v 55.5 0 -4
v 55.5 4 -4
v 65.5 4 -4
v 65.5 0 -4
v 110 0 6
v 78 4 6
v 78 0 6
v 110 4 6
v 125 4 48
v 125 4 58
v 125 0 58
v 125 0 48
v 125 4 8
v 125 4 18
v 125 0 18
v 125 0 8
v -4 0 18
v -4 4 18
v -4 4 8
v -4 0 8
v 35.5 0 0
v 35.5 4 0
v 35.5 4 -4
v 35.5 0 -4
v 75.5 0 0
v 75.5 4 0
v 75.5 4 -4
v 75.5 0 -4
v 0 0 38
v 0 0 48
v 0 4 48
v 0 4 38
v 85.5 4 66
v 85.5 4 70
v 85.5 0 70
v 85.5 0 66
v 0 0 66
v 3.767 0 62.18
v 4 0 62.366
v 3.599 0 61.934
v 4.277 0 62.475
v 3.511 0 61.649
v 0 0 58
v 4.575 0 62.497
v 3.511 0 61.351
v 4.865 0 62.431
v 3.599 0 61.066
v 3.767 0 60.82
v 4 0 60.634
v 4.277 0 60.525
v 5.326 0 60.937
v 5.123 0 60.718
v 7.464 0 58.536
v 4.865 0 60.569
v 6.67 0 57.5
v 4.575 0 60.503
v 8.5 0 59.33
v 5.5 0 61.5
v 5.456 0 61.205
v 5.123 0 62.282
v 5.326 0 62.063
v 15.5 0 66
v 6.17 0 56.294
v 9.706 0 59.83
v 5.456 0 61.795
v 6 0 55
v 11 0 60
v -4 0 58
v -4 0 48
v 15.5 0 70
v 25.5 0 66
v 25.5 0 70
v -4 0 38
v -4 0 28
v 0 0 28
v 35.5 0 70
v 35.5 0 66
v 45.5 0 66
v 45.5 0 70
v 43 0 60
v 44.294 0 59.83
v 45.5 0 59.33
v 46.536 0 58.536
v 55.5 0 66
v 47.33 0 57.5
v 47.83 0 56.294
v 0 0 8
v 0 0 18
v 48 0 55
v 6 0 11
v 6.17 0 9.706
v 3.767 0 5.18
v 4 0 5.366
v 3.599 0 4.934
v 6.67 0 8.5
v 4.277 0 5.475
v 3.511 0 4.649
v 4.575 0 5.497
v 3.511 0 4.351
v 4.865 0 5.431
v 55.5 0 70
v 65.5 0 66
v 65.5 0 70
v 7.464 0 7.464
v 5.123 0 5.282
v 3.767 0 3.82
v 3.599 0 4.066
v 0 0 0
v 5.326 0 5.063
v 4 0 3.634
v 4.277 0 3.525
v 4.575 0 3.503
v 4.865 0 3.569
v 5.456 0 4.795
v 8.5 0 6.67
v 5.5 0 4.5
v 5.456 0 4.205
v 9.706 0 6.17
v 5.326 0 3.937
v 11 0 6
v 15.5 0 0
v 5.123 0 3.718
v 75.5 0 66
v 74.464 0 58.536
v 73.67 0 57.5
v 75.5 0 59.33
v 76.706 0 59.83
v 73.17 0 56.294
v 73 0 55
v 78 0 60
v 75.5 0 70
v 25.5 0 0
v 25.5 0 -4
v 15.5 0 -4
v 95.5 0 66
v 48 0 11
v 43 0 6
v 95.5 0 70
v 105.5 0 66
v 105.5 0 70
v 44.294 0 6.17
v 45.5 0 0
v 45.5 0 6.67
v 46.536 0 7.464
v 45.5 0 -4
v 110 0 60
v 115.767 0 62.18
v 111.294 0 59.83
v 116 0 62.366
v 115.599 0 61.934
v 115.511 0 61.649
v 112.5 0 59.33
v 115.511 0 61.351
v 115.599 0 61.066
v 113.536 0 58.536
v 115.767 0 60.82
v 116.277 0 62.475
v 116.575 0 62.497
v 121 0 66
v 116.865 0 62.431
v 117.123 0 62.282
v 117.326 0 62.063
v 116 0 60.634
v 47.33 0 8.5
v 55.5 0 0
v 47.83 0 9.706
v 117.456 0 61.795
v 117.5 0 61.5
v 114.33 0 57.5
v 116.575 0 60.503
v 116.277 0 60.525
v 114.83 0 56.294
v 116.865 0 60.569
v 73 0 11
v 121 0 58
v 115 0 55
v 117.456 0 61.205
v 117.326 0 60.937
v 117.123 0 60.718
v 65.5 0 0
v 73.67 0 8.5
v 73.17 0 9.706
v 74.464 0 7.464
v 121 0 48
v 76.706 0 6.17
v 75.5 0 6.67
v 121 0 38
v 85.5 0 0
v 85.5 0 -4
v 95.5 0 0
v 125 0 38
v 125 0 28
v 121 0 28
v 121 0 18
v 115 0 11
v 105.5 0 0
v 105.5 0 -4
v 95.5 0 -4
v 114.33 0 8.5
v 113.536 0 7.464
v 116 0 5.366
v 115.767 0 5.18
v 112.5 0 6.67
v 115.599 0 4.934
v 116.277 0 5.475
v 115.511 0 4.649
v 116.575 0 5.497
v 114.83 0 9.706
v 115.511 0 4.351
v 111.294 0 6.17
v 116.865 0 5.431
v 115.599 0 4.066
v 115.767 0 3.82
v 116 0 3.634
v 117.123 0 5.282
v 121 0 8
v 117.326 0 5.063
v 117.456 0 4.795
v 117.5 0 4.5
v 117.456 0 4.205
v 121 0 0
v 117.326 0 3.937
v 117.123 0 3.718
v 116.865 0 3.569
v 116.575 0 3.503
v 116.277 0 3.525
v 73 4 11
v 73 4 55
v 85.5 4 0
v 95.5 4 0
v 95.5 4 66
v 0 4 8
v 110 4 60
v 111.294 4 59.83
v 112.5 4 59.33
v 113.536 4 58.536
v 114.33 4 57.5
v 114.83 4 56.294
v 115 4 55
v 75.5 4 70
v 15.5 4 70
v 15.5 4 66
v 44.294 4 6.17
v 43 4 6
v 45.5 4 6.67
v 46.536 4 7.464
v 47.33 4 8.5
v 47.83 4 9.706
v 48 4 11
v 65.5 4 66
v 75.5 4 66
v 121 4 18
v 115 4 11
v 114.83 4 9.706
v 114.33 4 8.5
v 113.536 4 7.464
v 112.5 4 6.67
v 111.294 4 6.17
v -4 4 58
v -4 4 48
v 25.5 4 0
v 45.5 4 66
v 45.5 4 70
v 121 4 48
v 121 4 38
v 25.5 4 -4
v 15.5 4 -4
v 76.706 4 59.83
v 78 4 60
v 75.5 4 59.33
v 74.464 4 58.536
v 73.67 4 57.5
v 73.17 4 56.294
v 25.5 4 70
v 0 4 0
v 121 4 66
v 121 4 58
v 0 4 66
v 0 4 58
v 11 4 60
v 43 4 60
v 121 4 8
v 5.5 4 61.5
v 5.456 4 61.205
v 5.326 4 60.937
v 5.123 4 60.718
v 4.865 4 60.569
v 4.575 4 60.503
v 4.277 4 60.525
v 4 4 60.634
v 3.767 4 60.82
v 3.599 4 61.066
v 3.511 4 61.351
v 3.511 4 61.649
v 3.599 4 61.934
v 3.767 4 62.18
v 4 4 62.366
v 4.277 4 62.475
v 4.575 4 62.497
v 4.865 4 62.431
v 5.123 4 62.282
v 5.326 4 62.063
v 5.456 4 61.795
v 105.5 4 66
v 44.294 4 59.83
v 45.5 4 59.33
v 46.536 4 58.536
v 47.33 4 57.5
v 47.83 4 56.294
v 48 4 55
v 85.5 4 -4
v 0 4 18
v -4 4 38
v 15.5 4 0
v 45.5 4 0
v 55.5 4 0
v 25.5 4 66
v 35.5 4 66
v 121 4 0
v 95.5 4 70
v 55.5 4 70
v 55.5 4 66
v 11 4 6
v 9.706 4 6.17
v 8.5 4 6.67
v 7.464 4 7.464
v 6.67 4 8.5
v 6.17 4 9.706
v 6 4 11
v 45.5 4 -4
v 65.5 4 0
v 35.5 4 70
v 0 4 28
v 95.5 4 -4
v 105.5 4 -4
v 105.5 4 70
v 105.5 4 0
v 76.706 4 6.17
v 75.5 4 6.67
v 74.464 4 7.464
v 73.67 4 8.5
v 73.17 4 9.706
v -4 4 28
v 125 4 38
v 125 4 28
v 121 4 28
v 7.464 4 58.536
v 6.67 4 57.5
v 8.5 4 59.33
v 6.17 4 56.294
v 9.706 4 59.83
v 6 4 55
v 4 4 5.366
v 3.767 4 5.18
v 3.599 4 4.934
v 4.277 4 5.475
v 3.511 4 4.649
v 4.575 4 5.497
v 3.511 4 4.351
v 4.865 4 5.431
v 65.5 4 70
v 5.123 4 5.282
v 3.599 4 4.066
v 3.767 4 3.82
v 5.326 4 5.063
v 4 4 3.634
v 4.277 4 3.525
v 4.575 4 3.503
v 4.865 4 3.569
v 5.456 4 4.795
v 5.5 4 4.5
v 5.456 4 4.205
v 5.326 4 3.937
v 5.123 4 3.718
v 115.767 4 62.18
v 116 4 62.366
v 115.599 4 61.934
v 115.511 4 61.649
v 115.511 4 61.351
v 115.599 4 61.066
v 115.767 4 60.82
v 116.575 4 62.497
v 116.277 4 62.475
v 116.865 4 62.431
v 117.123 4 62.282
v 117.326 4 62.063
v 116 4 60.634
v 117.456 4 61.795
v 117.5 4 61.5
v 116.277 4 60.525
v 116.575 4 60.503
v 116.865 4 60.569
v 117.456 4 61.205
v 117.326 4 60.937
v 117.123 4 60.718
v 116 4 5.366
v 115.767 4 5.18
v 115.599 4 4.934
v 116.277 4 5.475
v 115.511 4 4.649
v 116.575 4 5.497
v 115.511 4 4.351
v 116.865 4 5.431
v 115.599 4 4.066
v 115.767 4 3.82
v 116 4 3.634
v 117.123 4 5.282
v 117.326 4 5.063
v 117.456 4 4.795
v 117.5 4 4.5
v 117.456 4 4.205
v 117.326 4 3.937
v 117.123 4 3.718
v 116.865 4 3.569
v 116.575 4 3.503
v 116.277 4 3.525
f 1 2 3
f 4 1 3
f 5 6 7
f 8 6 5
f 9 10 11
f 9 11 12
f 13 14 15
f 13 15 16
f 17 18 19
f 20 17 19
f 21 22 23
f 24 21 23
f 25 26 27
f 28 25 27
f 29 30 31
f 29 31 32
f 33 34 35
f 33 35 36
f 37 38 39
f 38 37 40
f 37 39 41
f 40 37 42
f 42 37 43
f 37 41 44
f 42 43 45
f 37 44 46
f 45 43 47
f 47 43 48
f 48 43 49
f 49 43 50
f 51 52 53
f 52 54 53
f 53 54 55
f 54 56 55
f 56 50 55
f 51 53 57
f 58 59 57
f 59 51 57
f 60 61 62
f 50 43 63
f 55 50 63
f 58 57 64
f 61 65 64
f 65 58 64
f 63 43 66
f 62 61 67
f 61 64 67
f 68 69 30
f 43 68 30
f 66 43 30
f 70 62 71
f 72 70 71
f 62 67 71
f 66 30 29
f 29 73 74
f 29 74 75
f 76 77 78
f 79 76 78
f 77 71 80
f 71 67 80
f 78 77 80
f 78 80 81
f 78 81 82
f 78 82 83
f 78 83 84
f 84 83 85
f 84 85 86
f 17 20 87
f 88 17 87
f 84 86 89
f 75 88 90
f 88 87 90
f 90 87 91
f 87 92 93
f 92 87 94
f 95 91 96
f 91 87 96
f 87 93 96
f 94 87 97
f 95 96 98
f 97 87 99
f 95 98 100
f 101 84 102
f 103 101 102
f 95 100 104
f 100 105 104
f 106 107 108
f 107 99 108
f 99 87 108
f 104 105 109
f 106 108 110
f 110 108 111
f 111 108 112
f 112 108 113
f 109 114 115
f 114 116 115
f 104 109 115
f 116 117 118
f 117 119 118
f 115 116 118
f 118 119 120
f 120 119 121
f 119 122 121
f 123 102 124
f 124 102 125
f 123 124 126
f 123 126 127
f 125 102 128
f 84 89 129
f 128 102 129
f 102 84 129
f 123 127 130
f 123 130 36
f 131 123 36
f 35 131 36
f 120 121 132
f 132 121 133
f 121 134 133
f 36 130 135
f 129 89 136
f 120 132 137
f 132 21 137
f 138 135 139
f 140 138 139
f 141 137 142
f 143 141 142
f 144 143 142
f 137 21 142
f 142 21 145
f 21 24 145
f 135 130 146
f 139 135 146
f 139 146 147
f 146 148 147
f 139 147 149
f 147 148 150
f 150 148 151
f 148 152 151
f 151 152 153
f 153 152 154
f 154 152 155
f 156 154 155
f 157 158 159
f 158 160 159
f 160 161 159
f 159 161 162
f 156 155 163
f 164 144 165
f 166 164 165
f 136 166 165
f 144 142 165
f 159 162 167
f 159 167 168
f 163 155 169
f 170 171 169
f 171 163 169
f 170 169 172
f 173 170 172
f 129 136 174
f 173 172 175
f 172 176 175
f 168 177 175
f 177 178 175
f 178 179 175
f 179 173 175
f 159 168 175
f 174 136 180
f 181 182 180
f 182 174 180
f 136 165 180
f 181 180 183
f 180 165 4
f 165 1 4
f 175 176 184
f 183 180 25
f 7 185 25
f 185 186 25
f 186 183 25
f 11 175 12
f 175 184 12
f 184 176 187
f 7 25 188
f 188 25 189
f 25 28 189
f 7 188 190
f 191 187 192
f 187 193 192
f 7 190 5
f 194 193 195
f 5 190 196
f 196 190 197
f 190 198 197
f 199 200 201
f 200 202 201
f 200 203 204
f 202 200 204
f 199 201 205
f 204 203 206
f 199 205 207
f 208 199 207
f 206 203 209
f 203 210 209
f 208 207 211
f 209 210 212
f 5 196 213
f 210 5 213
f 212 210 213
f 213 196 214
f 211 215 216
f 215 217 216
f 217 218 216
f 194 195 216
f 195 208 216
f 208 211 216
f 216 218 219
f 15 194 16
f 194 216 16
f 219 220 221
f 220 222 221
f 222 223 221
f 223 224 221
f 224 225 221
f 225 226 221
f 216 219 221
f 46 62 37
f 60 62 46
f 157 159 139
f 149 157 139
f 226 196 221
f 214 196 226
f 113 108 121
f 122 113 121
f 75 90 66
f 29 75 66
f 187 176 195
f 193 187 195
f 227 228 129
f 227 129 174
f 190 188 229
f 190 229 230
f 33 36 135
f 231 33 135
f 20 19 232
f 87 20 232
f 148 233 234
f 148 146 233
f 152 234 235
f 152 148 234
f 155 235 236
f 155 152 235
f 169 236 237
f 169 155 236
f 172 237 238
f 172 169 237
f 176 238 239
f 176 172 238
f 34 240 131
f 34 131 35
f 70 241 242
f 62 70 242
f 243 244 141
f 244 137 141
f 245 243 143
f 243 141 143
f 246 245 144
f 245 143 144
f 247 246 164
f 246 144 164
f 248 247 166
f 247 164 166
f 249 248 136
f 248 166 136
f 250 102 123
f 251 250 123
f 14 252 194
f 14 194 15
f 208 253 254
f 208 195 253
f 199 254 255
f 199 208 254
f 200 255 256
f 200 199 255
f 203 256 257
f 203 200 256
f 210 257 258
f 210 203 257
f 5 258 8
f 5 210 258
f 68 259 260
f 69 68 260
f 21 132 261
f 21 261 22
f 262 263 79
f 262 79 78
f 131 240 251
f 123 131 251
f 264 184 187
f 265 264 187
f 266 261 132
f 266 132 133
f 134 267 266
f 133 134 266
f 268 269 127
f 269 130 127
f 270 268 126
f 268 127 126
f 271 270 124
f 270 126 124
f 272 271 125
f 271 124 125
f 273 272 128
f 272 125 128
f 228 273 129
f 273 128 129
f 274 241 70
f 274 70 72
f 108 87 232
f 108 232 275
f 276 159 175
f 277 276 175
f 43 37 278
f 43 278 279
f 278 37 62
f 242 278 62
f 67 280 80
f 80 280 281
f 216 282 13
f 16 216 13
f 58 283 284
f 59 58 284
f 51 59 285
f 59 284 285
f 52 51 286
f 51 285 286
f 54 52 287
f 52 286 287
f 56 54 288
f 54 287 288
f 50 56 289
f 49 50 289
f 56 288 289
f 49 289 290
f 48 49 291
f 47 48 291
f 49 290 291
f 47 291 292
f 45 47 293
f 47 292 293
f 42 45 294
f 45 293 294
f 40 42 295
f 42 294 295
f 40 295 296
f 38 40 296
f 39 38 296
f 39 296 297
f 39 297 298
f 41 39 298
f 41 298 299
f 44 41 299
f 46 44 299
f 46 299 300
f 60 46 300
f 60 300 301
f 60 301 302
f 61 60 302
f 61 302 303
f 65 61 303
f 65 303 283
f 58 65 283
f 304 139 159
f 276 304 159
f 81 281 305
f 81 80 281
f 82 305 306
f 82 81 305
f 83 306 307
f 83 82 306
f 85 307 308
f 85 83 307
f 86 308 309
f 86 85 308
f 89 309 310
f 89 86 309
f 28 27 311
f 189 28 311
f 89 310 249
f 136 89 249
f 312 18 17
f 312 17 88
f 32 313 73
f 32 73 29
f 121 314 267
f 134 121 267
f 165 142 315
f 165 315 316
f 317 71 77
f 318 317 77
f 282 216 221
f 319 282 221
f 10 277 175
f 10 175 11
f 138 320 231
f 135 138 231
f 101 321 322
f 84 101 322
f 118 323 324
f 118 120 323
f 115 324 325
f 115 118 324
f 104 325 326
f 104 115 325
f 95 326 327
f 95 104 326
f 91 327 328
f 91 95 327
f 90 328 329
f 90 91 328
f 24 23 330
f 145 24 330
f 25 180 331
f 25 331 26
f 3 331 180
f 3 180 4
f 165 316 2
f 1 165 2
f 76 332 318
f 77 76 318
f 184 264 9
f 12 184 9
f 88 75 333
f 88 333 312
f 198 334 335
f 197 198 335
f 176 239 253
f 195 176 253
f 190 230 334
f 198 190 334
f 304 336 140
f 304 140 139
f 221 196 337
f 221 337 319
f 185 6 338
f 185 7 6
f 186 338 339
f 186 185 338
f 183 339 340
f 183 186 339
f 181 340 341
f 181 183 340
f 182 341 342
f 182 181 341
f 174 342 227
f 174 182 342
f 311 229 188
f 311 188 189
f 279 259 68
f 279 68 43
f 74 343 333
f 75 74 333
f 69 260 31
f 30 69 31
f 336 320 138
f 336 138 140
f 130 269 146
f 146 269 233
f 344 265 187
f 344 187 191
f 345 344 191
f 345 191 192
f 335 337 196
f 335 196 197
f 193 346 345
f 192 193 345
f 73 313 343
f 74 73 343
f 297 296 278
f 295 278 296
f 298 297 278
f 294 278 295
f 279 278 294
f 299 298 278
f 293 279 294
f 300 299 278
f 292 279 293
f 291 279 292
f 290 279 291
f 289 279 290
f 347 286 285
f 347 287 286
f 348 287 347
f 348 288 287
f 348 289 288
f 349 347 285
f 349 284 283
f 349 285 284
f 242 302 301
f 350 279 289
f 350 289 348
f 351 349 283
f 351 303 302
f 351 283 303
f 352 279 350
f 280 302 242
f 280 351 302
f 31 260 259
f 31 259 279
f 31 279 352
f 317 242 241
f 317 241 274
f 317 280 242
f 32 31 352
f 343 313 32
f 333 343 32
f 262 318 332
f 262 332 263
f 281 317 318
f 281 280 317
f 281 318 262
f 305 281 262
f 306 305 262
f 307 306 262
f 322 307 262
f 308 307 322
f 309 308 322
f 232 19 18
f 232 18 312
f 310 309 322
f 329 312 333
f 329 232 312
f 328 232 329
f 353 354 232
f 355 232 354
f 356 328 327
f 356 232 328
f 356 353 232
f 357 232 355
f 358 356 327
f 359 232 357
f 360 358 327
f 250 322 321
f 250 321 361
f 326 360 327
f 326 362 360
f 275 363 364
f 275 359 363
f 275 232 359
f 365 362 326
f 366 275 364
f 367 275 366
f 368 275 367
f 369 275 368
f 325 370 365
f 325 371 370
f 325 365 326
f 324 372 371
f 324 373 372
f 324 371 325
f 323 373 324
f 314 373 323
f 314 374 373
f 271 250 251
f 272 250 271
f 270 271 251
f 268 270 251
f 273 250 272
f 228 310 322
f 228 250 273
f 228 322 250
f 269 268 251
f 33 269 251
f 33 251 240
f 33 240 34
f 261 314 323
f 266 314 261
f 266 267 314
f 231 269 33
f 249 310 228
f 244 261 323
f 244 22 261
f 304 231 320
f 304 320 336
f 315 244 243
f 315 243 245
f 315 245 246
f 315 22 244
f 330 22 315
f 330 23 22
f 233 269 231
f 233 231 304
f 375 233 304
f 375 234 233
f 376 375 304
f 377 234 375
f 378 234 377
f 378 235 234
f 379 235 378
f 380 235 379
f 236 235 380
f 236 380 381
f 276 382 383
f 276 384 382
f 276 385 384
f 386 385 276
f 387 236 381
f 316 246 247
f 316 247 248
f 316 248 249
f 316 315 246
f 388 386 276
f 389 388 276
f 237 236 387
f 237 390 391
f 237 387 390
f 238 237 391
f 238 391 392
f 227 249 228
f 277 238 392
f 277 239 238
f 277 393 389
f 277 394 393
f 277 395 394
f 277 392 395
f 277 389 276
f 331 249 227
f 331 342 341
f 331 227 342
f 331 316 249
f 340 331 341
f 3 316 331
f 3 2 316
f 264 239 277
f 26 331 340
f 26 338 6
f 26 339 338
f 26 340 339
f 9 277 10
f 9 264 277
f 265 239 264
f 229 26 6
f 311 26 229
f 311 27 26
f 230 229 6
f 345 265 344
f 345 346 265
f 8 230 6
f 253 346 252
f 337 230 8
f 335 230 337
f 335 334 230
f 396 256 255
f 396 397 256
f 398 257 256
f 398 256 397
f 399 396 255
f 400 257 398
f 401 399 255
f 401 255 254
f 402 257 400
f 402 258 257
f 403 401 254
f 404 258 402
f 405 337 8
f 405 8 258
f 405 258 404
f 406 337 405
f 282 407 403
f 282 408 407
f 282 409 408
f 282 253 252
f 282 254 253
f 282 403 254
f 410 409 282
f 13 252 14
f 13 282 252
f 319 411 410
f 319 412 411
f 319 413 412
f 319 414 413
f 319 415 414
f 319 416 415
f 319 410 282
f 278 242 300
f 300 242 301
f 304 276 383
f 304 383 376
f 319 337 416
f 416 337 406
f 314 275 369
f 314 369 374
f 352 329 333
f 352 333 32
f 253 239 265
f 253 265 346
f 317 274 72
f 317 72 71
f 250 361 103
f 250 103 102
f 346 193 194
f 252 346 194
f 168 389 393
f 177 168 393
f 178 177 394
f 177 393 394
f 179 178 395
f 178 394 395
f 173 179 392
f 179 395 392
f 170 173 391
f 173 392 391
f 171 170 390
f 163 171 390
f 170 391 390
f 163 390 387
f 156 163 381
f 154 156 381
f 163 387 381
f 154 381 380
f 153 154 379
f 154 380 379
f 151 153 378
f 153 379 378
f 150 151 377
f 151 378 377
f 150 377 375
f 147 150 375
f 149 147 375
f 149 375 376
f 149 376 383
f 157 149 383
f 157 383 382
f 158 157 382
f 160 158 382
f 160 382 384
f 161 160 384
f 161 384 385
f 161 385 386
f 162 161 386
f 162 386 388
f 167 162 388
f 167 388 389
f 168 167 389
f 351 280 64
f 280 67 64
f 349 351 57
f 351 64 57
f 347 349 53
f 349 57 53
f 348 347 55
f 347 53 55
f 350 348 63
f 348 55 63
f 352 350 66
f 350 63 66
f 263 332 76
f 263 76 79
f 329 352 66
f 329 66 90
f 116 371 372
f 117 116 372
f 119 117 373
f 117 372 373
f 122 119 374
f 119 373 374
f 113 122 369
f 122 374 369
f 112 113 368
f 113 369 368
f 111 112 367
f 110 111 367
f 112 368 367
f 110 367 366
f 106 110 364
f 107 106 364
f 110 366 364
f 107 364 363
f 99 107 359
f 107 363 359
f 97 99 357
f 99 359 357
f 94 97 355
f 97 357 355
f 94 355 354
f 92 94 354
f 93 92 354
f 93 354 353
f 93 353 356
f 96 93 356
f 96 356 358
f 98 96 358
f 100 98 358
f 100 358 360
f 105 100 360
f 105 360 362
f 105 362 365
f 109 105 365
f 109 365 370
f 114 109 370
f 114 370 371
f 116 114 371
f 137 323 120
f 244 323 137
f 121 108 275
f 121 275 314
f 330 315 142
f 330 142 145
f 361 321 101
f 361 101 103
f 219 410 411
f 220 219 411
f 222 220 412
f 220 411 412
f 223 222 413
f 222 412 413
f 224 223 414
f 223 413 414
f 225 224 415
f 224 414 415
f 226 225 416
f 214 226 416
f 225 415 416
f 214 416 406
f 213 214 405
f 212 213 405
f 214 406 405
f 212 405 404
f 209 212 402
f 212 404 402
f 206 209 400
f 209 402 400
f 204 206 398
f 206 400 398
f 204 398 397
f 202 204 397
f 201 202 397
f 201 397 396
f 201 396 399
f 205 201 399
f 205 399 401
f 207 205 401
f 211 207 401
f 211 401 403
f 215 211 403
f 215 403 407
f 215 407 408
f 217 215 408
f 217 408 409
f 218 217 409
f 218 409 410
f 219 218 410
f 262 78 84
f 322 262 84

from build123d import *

# Parameters (mm, degrees)
SKETCH1_W           = 121
SKETCH1_H           = 66
BOSS_EXTRUDE1_DEPTH = 4
SKETCH2_W           = 109
SKETCH2_H           = 54
CUT_EXTRUDE1_DEPTH  = 5
FILLET1_R           = 5
SKETCH3_W           = 25
SKETCH3_H           = 54
BOSS_EXTRUDE2_DEPTH = 4
FILLET2_R           = 5
SKETCH4_R           = 1
CUT_EXTRUDE2_DEPTH  = 5
SKETCH5_W           = 10
SKETCH5_H           = 4
BOSS_EXTRUDE3_DEPTH = 4
LPATTERN1_COUNT     = 3
LPATTERN1_PITCH     = 20
LPATTERN1_COL_COUNT = 3
LPATTERN1_COL_PITCH = 20
SKETCH6_W           = 4
SKETCH6_H           = 10
BOSS_EXTRUDE4_DEPTH = 4
LPATTERN2_COUNT     = 2
LPATTERN2_PITCH     = 20
LPATTERN2_COL_COUNT = 2
LPATTERN2_COL_PITCH = 20


with BuildPart() as part:
    # Sketch1 → Boss-Extrude1 (new body)
    with BuildSketch(Plane(origin=(0, 0, 0), x_dir=(1, 0, 0), z_dir=(0, 1, 0))):
        with Locations((60.5, -33)):
            Rectangle(SKETCH1_W, SKETCH1_H)
    extrude(amount=BOSS_EXTRUDE1_DEPTH)

    # Sketch2 → Cut-Extrude1 (cut, through all)
    with BuildSketch(Plane(origin=(0, 4, 0), x_dir=(1, 0, 0), z_dir=(0, 1, 0))):
        with Locations((60.5, -33)):
            Rectangle(SKETCH2_W, SKETCH2_H)
    extrude(amount=-CUT_EXTRUDE1_DEPTH, mode=Mode.SUBTRACT)

    # Fillet1
    fillet1_edges = [part.edges().sort_by_distance(p)[0] for p in [
        (115, 2, 6),
        (115, 2, 60),
        (6, 2, 60),
        (6, 2, 6),
    ]]
    fillet(fillet1_edges, radius=FILLET1_R)

    # Sketch3 → Boss-Extrude2 (add, through all)
    with BuildSketch(Plane(origin=(0, 4, 0), x_dir=(1, 0, 0), z_dir=(0, 1, 0))):
        with Locations((60.5, -33)):
            Rectangle(SKETCH3_W, SKETCH3_H)
    extrude(amount=-BOSS_EXTRUDE2_DEPTH)

    # Fillet2
    fillet2_edges = [part.edges().sort_by_distance(p)[0] for p in [
        (73, 2, 6),
        (73, 2, 60),
        (48, 2, 60),
        (48, 2, 6),
    ]]
    fillet(fillet2_edges, radius=FILLET2_R)

    # Sketch4 → Cut-Extrude2 (cut, through all)
    with BuildSketch(Plane(origin=(0, 4, 0), x_dir=(1, 0, 0), z_dir=(0, 1, 0))):
        with Locations((116.5, -61.5)):
            Circle(SKETCH4_R)
        with Locations((116.5, -4.5)):
            Circle(SKETCH4_R)
        with Locations((4.5, -4.5)):
            Circle(SKETCH4_R)
        with Locations((4.5, -61.5)):
            Circle(SKETCH4_R)
    extrude(amount=-CUT_EXTRUDE2_DEPTH, mode=Mode.SUBTRACT)

    # Sketch5 → Boss-Extrude3 (add, through all)
    with BuildSketch(Plane(origin=(0, 4, 0), x_dir=(1, 0, 0), z_dir=(0, 1, 0))):
        with Locations((60.5, 2)):
            Rectangle(SKETCH5_W, SKETCH5_H)
        with Locations((60.5, -68)):
            Rectangle(SKETCH5_W, SKETCH5_H)
    boss_extrude3 = extrude(amount=-BOSS_EXTRUDE3_DEPTH)

    # LPattern1: Boss-Extrude3 ×3
    with Locations(*[(i * LPATTERN1_PITCH, 0, 0) for i in range(1, LPATTERN1_COUNT)]):
        add(boss_extrude3)

    # LPattern1 col: Boss-Extrude3 ×3
    with Locations(*[(-i * LPATTERN1_COL_PITCH, 0, 0) for i in range(1, LPATTERN1_COL_COUNT)]):
        add(boss_extrude3)

    # Sketch6 → Boss-Extrude4 (add, through all)
    with BuildSketch(Plane(origin=(0, 4, 0), x_dir=(1, 0, 0), z_dir=(0, 1, 0))):
        with Locations((-2, -33)):
            Rectangle(SKETCH6_W, SKETCH6_H)
        with Locations((123, -33)):
            Rectangle(SKETCH6_W, SKETCH6_H)
    boss_extrude4 = extrude(amount=-BOSS_EXTRUDE4_DEPTH)

    # LPattern2: Boss-Extrude4 ×2
    with Locations(*[(0, 0, -i * LPATTERN2_PITCH) for i in range(1, LPATTERN2_COUNT)]):
        add(boss_extrude4)

    # LPattern2 col: Boss-Extrude4 ×2
    with Locations(*[(0, 0, i * LPATTERN2_COL_PITCH) for i in range(1, LPATTERN2_COL_COUNT)]):
        add(boss_extrude4)


solid = part.part
